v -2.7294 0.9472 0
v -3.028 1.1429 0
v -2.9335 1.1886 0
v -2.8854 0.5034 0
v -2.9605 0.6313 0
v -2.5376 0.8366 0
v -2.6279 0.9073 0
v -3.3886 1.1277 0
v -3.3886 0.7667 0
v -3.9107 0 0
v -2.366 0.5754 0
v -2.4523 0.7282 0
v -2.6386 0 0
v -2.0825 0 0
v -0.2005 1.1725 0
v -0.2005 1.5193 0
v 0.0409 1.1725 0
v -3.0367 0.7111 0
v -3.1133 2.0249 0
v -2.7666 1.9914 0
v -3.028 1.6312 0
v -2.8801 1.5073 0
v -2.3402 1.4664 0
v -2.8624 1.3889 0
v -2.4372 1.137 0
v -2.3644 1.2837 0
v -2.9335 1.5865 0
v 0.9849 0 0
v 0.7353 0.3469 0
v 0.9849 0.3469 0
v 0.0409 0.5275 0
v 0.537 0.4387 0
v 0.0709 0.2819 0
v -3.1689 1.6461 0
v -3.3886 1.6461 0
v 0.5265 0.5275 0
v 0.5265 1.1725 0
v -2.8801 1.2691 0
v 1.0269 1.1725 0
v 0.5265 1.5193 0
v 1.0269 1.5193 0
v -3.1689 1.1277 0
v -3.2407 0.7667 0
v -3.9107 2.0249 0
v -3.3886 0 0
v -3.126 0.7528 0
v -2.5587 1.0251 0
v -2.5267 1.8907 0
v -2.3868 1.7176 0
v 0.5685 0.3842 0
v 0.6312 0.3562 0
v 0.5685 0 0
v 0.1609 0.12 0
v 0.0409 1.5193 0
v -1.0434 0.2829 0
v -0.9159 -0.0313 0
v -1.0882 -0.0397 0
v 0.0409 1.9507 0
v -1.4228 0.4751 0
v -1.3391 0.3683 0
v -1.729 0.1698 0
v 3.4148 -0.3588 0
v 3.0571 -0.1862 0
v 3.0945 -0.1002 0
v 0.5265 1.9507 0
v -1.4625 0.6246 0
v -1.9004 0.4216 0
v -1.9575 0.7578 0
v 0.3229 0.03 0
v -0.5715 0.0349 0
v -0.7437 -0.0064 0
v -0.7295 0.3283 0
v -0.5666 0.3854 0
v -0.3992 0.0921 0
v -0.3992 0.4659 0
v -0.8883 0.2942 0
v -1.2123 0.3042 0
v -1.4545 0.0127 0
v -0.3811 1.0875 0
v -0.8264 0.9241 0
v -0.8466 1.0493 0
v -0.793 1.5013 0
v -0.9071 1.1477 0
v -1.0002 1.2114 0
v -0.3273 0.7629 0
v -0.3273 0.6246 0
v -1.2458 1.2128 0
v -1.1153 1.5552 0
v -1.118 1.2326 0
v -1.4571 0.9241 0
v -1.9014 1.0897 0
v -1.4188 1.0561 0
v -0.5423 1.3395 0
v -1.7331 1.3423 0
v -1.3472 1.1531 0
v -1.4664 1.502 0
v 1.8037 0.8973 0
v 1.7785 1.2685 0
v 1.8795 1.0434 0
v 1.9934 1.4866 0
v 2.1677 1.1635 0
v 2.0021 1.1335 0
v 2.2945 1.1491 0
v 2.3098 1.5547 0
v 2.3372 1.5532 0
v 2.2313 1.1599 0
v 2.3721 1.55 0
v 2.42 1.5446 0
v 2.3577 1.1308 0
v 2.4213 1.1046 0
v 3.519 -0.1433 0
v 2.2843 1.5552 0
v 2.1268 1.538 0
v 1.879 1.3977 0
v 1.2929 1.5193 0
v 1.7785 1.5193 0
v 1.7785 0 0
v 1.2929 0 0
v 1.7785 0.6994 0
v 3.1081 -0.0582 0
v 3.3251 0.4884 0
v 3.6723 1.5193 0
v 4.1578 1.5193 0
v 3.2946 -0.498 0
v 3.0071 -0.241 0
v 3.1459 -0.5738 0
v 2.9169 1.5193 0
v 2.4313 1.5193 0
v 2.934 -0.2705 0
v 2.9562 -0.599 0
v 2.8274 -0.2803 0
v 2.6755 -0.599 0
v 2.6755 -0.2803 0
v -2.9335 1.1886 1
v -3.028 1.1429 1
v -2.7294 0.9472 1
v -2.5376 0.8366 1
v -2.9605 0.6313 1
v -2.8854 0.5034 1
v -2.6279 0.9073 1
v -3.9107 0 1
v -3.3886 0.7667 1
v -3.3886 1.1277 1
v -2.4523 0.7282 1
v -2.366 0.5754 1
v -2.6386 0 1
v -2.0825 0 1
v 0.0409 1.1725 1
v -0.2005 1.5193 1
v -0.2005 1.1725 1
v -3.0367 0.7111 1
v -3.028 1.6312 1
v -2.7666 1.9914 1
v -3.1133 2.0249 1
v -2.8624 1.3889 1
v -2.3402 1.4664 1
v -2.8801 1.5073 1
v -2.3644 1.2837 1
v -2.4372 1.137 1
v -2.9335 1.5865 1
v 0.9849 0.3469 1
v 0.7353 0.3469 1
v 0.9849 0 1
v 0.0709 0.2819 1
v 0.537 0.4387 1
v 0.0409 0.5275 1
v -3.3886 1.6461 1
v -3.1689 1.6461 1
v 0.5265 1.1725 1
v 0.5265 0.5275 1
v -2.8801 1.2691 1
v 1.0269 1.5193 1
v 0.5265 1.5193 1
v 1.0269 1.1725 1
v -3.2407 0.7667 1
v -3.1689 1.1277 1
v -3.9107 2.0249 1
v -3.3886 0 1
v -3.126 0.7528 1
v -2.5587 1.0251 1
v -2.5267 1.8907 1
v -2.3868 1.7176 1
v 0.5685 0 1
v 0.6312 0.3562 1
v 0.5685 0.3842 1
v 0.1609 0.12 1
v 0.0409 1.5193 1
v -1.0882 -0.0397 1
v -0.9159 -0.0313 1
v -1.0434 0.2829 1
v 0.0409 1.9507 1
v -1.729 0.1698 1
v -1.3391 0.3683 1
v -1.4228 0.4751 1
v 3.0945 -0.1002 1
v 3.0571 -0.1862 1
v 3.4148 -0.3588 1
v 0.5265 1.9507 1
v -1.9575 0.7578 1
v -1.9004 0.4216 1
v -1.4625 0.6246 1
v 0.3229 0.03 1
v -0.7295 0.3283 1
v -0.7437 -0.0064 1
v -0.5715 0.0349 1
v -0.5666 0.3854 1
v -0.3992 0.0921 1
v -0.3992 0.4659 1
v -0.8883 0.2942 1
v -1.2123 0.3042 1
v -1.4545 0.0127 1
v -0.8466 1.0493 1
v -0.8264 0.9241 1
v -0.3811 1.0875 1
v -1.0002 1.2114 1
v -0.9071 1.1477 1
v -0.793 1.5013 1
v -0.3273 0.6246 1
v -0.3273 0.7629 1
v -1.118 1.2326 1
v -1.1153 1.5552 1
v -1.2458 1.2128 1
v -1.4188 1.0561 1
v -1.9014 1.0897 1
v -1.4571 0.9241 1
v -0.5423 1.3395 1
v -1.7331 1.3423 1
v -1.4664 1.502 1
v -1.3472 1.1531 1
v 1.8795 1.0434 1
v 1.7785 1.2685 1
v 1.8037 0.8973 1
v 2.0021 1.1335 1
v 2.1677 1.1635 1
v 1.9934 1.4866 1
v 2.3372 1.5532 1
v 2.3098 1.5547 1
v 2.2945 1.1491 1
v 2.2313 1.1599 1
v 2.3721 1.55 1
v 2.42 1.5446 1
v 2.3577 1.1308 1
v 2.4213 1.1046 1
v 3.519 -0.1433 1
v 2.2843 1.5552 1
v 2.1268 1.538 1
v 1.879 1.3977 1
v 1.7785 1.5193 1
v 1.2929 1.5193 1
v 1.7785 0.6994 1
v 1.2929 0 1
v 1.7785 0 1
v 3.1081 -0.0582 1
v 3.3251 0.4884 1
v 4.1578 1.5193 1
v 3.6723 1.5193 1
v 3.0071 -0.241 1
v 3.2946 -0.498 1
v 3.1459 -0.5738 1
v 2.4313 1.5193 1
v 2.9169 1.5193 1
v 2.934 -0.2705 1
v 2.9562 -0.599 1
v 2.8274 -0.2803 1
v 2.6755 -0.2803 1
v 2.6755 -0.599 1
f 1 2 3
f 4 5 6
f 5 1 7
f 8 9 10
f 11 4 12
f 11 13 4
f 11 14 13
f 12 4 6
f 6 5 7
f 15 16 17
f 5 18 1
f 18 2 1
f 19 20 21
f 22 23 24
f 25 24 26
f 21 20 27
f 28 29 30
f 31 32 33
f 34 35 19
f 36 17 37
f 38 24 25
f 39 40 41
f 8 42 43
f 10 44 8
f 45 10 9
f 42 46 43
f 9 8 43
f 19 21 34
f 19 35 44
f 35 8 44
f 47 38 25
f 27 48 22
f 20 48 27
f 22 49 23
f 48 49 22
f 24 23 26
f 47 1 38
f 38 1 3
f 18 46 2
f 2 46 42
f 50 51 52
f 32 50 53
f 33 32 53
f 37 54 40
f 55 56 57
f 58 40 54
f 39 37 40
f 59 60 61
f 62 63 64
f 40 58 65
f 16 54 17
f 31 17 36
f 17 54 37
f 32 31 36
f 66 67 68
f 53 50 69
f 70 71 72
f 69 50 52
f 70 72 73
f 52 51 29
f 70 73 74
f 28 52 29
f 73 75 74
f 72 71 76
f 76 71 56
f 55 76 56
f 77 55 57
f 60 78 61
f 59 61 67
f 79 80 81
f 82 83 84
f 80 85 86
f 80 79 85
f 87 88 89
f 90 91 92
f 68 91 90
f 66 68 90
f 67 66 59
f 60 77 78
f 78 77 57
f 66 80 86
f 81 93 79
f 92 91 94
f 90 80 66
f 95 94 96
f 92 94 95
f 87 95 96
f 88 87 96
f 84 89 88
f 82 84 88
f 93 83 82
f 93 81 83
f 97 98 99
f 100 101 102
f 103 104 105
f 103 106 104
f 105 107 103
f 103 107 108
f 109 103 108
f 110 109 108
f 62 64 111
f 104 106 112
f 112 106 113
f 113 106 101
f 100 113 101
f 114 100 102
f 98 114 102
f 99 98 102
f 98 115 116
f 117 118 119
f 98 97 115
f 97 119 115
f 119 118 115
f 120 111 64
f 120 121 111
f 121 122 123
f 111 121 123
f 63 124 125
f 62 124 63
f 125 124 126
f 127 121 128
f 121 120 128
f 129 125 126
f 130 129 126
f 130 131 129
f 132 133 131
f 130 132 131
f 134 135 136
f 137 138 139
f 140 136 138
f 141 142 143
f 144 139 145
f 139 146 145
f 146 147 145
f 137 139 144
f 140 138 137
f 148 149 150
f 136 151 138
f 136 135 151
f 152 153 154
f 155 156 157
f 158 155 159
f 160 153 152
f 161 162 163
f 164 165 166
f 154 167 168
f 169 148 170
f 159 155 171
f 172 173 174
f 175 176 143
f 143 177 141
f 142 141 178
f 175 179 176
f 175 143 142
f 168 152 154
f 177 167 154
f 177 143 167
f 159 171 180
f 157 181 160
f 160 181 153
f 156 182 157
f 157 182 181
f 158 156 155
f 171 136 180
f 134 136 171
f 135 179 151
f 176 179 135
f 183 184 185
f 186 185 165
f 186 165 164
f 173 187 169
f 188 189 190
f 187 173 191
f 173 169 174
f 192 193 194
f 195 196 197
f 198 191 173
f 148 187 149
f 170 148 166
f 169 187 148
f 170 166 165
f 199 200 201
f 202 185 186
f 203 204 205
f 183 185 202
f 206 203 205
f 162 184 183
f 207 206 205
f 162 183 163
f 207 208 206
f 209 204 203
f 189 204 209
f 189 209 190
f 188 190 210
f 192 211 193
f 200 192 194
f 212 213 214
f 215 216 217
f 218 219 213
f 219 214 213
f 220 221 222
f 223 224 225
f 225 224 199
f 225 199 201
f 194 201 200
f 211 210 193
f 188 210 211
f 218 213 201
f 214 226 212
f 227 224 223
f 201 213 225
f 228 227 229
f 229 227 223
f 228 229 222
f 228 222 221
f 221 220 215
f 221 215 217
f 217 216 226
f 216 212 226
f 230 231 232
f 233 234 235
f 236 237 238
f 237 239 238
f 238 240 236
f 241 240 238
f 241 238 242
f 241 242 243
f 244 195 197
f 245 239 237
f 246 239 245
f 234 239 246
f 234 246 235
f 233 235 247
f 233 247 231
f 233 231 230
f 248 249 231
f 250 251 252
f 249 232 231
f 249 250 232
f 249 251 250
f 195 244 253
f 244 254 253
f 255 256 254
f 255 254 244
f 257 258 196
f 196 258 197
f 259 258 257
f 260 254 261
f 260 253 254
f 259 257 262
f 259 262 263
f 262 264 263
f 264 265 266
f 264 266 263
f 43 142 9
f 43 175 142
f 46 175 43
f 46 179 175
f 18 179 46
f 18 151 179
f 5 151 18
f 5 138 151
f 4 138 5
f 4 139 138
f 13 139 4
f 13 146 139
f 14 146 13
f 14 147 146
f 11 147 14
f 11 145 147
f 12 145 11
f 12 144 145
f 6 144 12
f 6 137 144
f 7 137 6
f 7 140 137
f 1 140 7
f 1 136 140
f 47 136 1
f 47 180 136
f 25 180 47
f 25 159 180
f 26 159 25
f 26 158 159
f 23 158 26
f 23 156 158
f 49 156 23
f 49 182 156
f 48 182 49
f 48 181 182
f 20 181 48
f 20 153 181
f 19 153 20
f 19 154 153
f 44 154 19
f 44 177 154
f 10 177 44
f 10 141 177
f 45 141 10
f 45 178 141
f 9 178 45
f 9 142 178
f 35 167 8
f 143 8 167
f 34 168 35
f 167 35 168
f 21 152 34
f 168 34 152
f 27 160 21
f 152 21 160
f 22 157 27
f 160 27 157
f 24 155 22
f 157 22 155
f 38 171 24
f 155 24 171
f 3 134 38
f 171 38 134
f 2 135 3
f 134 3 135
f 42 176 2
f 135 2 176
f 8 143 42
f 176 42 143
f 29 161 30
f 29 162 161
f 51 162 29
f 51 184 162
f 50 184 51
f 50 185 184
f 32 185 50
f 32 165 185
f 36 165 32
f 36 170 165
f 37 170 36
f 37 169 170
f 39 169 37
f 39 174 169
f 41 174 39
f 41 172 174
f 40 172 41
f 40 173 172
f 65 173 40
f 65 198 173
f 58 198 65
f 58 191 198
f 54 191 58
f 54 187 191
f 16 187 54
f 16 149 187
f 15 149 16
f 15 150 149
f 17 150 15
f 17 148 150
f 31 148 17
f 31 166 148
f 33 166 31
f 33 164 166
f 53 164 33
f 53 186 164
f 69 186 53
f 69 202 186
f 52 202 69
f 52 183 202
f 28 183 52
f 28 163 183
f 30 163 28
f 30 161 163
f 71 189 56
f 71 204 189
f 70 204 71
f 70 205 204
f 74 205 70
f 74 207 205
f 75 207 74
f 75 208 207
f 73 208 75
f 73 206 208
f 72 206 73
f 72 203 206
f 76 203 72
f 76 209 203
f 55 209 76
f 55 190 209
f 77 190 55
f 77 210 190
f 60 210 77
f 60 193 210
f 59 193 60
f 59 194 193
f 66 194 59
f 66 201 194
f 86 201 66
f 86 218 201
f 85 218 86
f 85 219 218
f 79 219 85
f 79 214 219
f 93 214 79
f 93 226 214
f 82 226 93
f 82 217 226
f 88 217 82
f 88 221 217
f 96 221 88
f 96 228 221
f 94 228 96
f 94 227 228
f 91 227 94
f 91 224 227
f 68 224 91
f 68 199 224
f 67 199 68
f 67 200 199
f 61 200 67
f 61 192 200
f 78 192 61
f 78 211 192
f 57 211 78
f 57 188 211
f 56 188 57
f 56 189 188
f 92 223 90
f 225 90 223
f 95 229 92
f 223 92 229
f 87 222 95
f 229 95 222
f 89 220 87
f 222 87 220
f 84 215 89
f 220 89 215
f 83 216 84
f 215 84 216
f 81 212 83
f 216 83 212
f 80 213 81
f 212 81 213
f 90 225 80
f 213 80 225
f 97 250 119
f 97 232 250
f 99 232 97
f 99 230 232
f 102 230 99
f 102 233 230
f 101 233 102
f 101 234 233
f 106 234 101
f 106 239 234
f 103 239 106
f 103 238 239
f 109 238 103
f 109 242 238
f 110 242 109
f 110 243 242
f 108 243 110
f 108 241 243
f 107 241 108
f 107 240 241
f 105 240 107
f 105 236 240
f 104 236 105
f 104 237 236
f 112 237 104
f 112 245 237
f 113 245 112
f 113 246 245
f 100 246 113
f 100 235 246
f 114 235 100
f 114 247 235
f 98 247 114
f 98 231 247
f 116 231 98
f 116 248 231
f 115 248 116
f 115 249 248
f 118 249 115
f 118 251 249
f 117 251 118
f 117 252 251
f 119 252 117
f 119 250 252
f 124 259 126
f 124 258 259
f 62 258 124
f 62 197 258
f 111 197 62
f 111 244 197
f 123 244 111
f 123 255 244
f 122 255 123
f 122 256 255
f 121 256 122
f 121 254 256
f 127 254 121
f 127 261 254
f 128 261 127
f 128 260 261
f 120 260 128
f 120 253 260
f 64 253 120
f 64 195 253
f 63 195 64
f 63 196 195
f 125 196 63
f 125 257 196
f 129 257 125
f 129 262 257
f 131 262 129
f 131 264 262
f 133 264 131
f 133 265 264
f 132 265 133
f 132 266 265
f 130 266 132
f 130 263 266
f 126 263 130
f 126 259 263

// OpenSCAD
linear_extrude(1)
text("Retry", font="Verdana:style=Bold", size=2, halign="center");
